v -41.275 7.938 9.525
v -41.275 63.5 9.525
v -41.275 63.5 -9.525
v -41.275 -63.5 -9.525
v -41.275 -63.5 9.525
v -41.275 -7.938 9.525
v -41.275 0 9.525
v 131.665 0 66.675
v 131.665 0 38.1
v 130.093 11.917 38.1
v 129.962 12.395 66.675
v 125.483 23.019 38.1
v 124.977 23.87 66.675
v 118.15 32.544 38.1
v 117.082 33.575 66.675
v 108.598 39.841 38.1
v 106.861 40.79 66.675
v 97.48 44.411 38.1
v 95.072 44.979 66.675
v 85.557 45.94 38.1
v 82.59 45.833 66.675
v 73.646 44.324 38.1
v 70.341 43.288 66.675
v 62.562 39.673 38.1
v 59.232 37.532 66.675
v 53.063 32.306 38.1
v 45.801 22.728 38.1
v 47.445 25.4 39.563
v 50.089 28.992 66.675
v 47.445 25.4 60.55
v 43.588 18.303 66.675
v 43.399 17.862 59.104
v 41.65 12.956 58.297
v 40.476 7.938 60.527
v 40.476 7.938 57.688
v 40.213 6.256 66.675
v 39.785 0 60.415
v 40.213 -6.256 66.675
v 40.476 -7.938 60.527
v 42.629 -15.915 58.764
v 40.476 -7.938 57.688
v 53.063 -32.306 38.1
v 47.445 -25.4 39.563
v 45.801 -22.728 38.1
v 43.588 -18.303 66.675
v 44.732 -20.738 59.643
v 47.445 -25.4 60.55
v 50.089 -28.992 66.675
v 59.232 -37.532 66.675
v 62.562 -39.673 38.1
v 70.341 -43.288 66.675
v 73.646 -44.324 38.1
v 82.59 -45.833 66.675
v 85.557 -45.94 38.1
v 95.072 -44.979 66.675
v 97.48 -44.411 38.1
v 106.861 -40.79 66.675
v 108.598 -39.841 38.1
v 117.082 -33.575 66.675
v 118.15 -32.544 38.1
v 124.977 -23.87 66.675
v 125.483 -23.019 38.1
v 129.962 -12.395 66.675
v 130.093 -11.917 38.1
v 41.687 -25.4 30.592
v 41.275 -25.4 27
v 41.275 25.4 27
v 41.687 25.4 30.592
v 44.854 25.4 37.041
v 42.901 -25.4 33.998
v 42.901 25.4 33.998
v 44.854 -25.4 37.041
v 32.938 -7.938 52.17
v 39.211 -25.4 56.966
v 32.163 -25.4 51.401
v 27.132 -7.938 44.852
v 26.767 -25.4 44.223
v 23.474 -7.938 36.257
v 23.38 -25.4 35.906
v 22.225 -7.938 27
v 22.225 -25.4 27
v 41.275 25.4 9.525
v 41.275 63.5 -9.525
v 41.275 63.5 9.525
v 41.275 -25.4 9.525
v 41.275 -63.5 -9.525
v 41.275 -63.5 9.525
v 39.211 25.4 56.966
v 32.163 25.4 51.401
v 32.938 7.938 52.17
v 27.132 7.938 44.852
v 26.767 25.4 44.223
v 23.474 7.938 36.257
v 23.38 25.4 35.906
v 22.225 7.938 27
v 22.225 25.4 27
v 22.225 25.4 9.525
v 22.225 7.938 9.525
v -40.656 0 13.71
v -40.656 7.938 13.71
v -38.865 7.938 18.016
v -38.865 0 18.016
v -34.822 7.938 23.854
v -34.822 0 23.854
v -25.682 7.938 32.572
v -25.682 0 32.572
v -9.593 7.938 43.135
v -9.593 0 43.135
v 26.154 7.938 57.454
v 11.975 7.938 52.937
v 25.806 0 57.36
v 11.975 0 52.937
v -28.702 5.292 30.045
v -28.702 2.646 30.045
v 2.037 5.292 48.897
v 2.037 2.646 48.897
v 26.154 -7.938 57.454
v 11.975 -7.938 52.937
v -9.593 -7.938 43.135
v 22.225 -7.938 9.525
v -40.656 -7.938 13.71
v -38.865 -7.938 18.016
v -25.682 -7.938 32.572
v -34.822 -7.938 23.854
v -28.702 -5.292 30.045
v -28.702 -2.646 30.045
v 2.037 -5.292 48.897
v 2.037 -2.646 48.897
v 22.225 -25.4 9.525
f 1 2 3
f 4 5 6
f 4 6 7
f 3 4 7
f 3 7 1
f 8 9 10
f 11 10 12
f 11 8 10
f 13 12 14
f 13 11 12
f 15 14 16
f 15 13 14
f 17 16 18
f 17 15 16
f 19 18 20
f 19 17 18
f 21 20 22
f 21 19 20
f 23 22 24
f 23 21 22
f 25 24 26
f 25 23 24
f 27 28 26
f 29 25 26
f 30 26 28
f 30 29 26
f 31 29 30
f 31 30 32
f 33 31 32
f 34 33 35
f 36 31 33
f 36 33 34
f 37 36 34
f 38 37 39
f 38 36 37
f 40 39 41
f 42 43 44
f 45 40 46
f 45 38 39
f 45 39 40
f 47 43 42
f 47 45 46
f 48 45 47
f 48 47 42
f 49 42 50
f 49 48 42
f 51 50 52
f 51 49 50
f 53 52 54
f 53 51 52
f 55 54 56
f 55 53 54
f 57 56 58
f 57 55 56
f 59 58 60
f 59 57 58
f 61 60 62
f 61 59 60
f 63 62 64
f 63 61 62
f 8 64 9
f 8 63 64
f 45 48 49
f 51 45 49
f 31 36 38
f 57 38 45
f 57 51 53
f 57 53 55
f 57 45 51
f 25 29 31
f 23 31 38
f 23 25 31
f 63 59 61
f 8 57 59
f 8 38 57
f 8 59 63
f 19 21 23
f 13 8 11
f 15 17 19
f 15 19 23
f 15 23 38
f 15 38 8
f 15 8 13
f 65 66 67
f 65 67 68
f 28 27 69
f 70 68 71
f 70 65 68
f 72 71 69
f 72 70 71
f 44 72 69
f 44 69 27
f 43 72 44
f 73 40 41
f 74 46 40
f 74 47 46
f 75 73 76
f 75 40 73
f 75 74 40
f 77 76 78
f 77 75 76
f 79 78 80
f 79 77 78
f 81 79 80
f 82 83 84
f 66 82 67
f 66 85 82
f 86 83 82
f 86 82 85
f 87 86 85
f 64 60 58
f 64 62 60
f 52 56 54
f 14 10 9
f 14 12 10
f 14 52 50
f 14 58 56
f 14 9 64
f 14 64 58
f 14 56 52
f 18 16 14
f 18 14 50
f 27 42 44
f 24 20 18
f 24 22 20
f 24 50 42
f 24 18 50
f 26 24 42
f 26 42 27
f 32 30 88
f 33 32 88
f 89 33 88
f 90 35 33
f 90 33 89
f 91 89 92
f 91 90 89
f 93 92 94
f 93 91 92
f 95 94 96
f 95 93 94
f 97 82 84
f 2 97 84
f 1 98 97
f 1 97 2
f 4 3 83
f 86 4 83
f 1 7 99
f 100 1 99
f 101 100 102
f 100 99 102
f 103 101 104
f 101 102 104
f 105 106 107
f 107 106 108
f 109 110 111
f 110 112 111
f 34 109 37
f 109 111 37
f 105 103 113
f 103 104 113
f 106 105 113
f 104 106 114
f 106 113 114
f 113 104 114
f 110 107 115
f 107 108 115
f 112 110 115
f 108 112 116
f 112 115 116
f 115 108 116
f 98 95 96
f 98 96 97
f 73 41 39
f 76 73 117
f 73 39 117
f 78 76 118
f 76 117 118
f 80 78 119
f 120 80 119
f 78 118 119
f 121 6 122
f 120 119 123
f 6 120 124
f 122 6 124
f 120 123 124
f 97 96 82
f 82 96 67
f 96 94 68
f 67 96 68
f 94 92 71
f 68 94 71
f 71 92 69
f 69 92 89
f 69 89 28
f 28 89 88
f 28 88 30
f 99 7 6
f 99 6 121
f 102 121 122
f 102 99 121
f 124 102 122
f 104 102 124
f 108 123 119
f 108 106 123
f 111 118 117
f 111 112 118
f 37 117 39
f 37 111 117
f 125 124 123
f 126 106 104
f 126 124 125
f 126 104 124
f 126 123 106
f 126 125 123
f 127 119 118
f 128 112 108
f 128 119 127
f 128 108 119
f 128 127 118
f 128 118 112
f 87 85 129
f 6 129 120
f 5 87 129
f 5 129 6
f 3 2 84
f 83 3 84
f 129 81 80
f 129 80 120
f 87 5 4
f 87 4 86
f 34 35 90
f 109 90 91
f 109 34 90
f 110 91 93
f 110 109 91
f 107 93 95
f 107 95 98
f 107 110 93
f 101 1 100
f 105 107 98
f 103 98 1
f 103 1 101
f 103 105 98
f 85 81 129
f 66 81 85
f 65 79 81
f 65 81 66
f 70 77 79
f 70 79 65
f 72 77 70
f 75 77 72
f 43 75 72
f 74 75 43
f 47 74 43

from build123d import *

# Parameters (mm, degrees)
F1_DEPTH = 63.5
F0_W     = 4.859683
F0_H     = 4.7752
F2_DEPTH = 25.4
F3_DEPTH = 7.9375


with BuildPart() as f1:
    # F0 (on Front) → F1 (new body, symmetric)
    with BuildSketch(Plane.XZ):
        Polygon((-41.275, 9.525), (-41.275, -9.525), (41.275, -9.525), (41.275, 9.525), (22.225, 9.525), align=None)
    extrude(amount=F1_DEPTH, both=True)

    # F0 (on Front) → F2 (join, symmetric)
    with BuildSketch(Plane.XZ):
        with BuildLine():
            Line((22.225, 9.525), (41.275, 9.525))
            Line((41.275, 9.525), (41.275, 27.0002))
            ThreePointArc((41.275, 27.0002), (45.92468, 38.22552), (57.15, 42.8752))
            Line((57.15, 42.8752), (80.865317, 42.8752))
            Line((80.865317, 42.8752), (80.865317, 61.9252))
            Line((80.865317, 61.9252), (57.15, 61.9252))
            ThreePointArc((57.15, 61.9252), (32.454296, 51.695904), (22.225, 27.0002))
            Line((22.225, 27.0002), (22.225, 9.525))
        make_face()
        with Locations((83.295158, 40.4876)):
            Rectangle(F0_W, F0_H)
    extrude(amount=F2_DEPTH, both=True)

    # F0 (on Front) → F3 (join, symmetric)
    with BuildSketch(Plane.XZ):
        with BuildLine():
            add(Edge.make_bspline(
                [(-41.275, 9.525), (-41.275, 31.890627), (15.217554, 61.9252), (57.15, 61.9252)],
                knots=[0, 0, 0, 0, 111.504536, 111.504536, 111.504536, 111.504536], degree=3))
            Line((-41.275, 9.525), (22.225, 9.525))
            Line((22.225, 9.525), (22.225, 27.0002))
            ThreePointArc((22.225, 27.0002), (32.454296, 51.695904), (57.15, 61.9252))
        make_face()
    extrude(amount=F3_DEPTH, both=True)

    # F0 (on Front) → F4 (revolve)
    with BuildSketch(Plane.XZ):
        Polygon((85.725, 66.675), (85.725, 61.9252), (85.725, 42.8752), (85.725, 38.1), (131.665317, 38.1), (131.665317, 66.675), align=None)
    revolve(axis=Axis((85.725, 0, 52.3875), (0, 0, 1)))


solid = f1.part
